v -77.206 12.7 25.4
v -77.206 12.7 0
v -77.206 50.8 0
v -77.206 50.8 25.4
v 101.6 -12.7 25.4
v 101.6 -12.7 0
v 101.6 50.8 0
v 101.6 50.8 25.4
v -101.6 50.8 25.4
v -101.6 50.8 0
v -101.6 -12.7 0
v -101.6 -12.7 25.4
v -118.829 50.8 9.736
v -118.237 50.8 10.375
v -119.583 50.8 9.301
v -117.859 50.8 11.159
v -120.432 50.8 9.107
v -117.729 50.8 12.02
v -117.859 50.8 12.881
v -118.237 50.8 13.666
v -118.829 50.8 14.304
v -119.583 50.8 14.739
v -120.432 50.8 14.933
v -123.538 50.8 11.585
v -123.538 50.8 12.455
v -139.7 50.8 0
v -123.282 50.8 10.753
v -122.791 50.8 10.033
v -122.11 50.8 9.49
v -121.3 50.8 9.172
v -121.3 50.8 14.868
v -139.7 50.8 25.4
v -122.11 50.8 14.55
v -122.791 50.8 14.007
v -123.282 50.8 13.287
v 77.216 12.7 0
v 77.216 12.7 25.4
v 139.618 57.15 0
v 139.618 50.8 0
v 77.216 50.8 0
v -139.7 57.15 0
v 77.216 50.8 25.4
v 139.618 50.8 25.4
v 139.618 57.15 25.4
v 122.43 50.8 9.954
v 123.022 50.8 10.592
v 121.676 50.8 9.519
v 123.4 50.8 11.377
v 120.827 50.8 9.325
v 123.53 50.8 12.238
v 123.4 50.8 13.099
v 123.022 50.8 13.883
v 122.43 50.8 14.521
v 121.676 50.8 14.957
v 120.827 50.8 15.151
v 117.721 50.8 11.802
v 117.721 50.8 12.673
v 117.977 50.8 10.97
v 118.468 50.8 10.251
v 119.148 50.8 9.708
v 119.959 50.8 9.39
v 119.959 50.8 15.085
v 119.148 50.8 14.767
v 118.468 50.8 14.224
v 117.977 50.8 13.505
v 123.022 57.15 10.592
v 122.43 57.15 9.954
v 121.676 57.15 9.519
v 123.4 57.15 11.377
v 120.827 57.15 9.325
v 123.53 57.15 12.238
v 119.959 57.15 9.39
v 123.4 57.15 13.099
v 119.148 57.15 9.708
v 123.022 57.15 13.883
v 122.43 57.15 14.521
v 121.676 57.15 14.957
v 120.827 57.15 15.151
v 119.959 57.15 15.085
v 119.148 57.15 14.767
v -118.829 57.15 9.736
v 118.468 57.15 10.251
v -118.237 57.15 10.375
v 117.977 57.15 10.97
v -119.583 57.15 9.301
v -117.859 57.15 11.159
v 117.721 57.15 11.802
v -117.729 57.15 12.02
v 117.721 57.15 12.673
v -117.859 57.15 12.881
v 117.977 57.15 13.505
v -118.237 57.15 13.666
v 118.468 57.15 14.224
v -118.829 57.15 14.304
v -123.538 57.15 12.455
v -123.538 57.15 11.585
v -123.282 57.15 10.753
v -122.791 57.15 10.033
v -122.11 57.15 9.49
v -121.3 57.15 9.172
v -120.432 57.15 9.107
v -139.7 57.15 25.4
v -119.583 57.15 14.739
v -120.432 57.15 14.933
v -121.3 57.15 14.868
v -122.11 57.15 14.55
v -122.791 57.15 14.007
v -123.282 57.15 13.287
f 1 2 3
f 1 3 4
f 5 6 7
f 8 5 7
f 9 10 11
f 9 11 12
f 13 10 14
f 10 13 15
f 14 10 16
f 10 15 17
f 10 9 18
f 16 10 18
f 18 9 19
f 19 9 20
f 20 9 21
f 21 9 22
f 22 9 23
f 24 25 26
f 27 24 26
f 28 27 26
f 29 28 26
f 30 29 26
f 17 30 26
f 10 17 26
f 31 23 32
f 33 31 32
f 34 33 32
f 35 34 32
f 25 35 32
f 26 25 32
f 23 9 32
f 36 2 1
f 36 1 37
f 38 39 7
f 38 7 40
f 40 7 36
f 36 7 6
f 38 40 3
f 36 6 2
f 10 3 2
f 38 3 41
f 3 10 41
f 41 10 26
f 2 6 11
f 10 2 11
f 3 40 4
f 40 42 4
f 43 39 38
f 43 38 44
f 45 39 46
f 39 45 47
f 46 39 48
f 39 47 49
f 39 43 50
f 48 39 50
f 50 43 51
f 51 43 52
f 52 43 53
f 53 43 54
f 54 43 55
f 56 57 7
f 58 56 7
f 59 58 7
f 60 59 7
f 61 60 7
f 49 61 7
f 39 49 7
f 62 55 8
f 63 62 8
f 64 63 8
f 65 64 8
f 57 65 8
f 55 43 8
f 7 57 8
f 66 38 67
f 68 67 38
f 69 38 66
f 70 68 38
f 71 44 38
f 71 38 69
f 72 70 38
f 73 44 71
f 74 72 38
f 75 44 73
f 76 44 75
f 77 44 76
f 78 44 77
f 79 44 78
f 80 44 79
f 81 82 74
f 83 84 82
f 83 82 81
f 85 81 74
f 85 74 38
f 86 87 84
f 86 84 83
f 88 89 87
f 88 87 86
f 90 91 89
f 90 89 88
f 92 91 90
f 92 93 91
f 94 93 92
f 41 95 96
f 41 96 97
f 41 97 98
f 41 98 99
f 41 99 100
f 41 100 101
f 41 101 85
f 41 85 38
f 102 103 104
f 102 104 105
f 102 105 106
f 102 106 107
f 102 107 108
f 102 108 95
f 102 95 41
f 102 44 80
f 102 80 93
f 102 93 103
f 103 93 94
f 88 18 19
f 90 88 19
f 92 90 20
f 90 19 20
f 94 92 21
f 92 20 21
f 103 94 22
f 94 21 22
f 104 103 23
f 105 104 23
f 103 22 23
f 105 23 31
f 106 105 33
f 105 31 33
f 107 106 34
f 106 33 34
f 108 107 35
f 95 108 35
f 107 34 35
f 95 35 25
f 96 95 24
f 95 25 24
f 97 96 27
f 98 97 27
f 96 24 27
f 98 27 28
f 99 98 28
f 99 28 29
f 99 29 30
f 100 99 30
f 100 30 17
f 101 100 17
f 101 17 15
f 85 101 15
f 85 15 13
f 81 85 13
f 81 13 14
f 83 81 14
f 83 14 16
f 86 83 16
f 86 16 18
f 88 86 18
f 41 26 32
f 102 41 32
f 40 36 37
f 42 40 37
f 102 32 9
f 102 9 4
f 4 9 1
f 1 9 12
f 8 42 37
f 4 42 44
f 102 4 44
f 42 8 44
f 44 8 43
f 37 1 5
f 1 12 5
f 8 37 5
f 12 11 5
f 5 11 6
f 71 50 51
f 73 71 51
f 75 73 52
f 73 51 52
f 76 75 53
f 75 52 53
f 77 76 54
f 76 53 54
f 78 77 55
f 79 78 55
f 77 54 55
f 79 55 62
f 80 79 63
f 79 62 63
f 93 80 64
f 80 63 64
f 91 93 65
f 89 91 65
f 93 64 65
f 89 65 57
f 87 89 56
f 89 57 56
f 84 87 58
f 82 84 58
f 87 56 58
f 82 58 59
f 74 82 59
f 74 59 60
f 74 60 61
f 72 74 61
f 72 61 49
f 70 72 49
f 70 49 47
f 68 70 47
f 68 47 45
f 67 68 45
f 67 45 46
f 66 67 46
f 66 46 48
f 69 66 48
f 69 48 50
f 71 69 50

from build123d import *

# Parameters (mm, degrees)
F0_W     = 203.2
F0_H     = 25.4
F1_DEPTH = 25.4
F2_W     = 24.3940738201
F2_H     = 25.4
F2_W_2   = 24.384
F3_DEPTH = 38.1
F4_W     = 38.1
F4_H     = 25.4
F4_W_2   = 203.1179050207
F5_DEPTH = 6.35
F6_R     = 2.921
F7_DEPTH = 25.4
F8_R     = 2.921
F9_DEPTH = 25.4


with BuildPart() as f1:
    # F0 (on Top) → F1 (new body)
    with BuildSketch(Plane.XY):
        Rectangle(F0_W, F0_H)
    extrude(amount=F1_DEPTH)

    # F2 (on face) → F3 (join)
    with BuildSketch(Plane(origin=(0, 12.7, 0), x_dir=(-1, 0, 0), z_dir=(0, 1, 0))):
        with Locations((89.4029630899, 12.7)):
            Rectangle(F2_W, F2_H)
        with Locations((-89.408, 12.7)):
            Rectangle(F2_W_2, F2_H)
    extrude(amount=F3_DEPTH)

    # F4 (on face) → F5 (join)
    with BuildSketch(Plane(origin=(0, 50.8, 0), x_dir=(-1, 0, 0), z_dir=(0, 1, 0))):
        with Locations((120.65, 12.7)):
            Rectangle(F4_W, F4_H)
        with Locations((0.0410474896, 12.7)):
            Rectangle(F4_W_2, F4_H)
        with Locations((-120.5679050207, 12.7)):
            Rectangle(F4_W, F4_H)
    extrude(amount=F5_DEPTH)

    # F6 (on face) → F7 (cut)
    with BuildSketch(Plane.XZ.offset(-50.8)):
        with Locations((-120.65, 12.0200840756)):
            Circle(F6_R)
    extrude(amount=-F7_DEPTH, mode=Mode.SUBTRACT)

    # F8 (on face) → F9 (cut)
    with BuildSketch(Plane.XZ.offset(-50.8)):
        with Locations((120.6089525104, 12.2376885265)):
            Circle(F8_R)
    extrude(amount=-F9_DEPTH, mode=Mode.SUBTRACT)


solid = f1.part
